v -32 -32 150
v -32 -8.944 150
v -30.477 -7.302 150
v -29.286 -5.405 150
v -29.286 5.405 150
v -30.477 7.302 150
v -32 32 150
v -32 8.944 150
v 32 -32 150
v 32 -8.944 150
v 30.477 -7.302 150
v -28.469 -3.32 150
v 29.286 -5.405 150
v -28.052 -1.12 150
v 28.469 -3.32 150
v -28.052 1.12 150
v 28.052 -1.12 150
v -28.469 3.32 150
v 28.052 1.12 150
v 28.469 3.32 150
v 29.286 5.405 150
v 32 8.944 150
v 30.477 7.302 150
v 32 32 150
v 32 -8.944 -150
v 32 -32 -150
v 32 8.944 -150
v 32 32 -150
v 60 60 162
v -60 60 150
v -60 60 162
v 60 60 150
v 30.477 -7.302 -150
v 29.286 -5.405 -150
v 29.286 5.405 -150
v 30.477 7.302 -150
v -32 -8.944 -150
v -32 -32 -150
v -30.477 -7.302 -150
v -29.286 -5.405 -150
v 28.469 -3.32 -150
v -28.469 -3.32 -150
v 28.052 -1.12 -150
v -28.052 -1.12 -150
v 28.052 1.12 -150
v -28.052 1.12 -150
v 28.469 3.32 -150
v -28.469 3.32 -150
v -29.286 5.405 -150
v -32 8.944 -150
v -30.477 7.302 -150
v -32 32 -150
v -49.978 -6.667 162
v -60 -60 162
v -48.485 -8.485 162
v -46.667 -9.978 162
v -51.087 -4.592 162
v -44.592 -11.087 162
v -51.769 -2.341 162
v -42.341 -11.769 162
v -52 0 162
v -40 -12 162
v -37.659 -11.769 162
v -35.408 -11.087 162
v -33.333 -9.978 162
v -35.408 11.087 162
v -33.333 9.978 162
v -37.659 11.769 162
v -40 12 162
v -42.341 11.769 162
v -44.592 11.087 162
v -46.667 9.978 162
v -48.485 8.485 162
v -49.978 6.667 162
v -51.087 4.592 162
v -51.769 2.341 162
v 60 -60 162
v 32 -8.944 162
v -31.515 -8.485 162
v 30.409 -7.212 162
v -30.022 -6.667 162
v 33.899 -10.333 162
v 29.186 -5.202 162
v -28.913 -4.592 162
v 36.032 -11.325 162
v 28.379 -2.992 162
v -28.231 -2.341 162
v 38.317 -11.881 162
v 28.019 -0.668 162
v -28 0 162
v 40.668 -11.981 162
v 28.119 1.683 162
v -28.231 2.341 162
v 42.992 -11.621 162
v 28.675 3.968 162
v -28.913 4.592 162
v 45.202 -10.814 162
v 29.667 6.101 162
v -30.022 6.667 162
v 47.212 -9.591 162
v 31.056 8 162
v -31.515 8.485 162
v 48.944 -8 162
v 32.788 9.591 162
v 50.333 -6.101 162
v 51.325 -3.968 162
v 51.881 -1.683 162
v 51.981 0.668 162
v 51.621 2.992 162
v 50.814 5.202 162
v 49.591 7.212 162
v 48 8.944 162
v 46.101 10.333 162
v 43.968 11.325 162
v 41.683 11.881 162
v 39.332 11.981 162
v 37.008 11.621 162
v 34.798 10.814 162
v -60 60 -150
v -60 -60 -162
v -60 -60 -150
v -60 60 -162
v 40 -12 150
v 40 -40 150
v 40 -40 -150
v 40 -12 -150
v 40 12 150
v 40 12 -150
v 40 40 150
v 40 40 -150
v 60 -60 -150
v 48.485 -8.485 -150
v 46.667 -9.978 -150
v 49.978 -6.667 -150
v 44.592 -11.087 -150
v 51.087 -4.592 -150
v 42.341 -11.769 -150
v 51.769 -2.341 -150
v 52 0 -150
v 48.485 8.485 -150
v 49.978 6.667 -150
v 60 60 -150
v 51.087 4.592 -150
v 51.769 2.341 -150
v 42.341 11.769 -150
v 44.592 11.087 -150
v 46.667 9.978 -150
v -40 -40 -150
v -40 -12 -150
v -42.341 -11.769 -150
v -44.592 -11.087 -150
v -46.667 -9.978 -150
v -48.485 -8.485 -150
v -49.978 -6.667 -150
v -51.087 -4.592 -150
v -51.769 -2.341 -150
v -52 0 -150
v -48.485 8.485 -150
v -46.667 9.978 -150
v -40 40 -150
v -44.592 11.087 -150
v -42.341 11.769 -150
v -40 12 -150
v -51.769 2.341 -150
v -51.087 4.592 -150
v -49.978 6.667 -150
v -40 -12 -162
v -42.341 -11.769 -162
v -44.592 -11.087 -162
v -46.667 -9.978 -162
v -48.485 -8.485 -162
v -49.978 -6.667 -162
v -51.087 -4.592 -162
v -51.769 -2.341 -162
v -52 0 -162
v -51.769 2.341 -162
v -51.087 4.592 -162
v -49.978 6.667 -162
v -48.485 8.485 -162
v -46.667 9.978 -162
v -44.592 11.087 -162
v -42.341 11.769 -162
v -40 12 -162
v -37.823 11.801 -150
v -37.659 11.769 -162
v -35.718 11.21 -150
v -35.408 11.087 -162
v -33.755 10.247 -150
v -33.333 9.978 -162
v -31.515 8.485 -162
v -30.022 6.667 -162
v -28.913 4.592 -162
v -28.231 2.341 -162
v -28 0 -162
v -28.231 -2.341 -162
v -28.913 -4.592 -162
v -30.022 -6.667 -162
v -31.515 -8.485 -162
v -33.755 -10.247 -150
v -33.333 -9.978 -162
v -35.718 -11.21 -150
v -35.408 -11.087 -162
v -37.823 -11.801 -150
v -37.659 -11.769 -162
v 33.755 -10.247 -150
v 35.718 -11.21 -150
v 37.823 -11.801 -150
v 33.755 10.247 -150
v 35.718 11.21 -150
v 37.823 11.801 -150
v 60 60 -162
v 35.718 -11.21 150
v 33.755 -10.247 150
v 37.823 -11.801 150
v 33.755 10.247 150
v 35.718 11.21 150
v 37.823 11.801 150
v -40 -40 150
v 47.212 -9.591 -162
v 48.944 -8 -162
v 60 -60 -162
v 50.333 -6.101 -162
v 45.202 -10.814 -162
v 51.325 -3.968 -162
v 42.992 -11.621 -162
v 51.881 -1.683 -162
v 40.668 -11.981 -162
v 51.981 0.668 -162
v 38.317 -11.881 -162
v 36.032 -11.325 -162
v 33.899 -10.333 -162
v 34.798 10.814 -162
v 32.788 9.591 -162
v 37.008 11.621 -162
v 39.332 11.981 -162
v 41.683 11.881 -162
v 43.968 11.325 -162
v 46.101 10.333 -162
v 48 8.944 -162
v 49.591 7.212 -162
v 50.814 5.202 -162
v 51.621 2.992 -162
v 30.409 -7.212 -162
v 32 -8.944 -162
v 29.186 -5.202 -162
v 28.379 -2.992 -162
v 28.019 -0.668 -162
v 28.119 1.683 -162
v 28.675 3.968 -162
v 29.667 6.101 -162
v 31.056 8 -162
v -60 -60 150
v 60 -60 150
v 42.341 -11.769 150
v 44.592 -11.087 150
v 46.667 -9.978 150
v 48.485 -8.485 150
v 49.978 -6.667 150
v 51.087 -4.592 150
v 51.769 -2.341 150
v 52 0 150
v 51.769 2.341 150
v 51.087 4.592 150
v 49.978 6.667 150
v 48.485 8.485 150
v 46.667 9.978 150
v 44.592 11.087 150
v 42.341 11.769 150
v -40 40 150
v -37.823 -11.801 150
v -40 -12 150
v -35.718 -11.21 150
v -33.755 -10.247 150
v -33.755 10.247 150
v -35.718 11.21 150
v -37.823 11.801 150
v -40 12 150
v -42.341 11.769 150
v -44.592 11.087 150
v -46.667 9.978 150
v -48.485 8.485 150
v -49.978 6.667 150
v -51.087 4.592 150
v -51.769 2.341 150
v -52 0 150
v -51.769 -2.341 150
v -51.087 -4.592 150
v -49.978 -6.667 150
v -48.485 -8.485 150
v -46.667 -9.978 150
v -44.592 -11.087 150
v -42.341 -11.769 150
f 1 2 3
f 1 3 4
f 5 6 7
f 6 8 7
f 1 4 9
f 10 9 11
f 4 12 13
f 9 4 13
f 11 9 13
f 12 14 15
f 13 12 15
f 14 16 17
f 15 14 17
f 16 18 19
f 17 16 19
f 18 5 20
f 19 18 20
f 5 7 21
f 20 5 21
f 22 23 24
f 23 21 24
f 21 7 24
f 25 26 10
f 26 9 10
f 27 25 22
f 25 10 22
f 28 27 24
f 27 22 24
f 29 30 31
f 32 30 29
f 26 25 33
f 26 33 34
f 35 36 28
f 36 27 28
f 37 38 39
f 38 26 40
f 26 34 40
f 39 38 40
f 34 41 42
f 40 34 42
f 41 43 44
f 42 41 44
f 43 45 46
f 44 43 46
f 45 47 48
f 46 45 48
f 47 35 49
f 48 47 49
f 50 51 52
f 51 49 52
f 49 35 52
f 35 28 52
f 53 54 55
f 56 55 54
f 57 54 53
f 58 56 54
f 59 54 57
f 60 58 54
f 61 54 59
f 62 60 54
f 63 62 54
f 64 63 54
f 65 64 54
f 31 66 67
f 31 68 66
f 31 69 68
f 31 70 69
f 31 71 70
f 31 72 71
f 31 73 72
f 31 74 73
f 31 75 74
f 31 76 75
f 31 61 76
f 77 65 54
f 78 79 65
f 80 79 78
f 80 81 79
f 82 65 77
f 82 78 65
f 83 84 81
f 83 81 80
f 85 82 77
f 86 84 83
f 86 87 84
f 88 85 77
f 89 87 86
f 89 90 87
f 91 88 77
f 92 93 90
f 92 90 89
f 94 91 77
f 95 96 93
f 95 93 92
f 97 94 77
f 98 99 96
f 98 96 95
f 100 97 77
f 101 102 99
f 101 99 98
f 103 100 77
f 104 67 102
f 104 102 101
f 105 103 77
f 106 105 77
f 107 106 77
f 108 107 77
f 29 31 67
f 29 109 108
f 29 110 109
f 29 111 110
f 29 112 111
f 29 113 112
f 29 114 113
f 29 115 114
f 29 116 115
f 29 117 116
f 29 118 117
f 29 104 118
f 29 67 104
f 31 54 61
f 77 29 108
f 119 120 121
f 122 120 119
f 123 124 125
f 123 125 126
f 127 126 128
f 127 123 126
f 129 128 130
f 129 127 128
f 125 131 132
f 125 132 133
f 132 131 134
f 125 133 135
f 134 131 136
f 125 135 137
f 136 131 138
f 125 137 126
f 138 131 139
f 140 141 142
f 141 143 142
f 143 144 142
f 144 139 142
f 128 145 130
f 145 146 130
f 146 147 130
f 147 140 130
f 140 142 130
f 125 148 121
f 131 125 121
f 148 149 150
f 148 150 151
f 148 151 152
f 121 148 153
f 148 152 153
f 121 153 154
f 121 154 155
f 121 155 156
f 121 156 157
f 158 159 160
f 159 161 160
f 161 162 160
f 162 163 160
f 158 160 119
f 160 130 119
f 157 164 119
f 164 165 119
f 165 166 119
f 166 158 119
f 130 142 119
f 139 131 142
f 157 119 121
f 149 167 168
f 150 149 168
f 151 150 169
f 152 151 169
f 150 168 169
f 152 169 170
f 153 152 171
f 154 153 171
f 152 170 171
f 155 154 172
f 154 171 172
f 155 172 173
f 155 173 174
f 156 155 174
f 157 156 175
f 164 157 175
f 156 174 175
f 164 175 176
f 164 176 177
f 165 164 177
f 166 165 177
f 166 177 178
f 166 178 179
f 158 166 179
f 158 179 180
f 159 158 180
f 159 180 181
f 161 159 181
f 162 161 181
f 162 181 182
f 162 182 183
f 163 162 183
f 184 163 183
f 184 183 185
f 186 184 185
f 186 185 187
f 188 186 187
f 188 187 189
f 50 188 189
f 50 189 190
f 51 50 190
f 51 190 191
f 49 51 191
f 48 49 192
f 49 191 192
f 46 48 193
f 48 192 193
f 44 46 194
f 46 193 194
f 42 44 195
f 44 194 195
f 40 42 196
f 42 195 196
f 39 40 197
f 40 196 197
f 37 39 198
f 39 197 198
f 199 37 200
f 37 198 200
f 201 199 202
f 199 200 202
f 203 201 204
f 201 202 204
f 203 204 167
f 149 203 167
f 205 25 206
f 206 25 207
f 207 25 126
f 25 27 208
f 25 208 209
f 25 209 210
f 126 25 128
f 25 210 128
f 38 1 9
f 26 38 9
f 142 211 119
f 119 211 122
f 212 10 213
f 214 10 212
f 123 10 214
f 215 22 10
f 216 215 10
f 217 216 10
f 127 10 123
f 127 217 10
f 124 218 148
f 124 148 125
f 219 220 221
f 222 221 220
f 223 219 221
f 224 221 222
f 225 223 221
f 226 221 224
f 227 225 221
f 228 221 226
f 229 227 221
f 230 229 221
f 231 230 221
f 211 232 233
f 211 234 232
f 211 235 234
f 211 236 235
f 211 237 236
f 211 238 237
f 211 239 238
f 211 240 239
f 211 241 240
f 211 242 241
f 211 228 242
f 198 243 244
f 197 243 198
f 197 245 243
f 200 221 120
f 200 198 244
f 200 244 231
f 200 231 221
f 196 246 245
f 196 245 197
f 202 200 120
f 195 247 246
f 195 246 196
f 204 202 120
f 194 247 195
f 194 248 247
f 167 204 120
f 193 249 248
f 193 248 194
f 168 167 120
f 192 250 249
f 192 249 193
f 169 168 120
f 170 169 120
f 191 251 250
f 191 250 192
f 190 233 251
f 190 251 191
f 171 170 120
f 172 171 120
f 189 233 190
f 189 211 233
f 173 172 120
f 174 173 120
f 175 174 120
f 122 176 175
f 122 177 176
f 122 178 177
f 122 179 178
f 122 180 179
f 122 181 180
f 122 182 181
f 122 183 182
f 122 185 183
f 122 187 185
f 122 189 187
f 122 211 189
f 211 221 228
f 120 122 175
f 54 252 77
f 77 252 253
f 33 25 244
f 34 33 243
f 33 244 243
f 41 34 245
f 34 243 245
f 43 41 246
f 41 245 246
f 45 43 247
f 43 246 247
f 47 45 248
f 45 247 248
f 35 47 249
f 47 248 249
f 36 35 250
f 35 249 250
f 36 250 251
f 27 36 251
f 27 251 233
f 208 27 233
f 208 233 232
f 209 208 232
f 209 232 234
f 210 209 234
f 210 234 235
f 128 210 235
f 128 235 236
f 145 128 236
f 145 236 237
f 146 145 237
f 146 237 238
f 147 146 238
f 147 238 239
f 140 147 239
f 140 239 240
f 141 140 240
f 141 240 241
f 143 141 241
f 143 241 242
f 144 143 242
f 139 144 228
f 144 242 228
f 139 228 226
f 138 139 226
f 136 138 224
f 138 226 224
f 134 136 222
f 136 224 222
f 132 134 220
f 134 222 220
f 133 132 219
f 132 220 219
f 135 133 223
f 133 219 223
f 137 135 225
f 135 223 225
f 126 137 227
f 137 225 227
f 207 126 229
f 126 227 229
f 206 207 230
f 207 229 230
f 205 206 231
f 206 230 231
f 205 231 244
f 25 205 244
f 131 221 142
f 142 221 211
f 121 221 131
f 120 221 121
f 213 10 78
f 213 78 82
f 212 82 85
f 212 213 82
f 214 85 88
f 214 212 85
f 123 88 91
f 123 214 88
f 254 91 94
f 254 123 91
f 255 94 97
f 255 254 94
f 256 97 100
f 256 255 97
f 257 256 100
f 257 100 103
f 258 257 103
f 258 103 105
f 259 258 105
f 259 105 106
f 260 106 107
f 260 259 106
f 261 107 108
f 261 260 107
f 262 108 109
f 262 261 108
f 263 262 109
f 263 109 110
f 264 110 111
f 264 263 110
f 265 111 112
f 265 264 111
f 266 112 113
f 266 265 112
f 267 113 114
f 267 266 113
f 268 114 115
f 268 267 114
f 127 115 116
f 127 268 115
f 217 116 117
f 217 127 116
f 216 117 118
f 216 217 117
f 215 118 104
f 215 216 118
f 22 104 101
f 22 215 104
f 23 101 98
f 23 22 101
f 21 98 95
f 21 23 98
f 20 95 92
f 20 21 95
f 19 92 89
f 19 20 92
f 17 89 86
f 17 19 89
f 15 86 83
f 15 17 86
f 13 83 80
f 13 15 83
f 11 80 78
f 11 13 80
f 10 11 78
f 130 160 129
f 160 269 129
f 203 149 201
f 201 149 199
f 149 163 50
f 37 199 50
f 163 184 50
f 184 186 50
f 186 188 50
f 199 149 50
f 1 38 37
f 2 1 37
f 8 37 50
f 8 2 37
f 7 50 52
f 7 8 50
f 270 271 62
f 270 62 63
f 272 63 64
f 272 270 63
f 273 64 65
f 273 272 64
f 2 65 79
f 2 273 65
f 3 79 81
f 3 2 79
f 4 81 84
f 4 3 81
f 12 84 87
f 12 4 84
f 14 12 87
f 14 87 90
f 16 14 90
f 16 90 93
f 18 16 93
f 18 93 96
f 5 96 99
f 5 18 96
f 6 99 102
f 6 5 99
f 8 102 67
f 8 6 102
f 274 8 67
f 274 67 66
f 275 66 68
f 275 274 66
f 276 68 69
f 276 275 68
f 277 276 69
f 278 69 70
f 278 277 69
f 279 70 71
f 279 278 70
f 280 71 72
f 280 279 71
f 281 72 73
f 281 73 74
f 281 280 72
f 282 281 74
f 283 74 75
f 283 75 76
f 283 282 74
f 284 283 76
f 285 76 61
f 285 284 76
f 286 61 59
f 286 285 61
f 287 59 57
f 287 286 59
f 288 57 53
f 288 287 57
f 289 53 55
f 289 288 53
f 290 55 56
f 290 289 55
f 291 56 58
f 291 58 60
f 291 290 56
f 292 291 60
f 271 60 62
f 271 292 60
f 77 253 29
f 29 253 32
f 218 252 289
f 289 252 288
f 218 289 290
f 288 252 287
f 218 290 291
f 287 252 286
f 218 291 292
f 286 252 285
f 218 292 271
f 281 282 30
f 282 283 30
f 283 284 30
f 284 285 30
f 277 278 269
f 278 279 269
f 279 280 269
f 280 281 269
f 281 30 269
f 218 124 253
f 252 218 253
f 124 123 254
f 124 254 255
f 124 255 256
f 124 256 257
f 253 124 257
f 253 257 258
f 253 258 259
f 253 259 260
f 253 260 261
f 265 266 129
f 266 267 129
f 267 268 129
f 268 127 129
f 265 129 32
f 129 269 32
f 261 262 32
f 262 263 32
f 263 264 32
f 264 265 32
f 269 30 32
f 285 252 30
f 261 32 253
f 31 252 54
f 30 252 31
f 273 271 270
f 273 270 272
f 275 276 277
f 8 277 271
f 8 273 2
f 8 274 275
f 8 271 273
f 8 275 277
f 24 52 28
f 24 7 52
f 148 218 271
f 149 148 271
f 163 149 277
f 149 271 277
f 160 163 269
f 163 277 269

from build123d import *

# Parameters (mm, degrees)
SKETCH_8_W      = 80
SKETCH_8_H      = 80
SKETCH_8_W_2    = 64
SKETCH_8_H_2    = 64
EXTRUDE_1_DEPTH = 150
SKETCH_9_W      = 120
SKETCH_9_H      = 120
SKETCH_9_R      = 12
EXTRUDE_2_DEPTH = 12
EXTRUDE_START   = 12
SKETCH_10_W     = 120
SKETCH_10_H     = 120
SKETCH_10_R     = 12
EXTRUDE_3_DEPTH = 12


with BuildPart() as part:
    # 草图8 → 凸台-拉伸1 (new, symmetric)
    with BuildSketch(Plane.XY):
        Rectangle(SKETCH_8_W, SKETCH_8_H)
        Rectangle(SKETCH_8_W_2, SKETCH_8_H_2, mode=Mode.SUBTRACT)
    extrude(amount=EXTRUDE_1_DEPTH, both=True)

    # 草图9 → 凸台-拉伸2 (add)
    with BuildSketch(Plane.XY.offset(150)):
        Rectangle(SKETCH_9_W, SKETCH_9_H)
        with Locations(Location((40, 0, 0), (0, 0, 228.189685104))):
            Circle(SKETCH_9_R, mode=Mode.SUBTRACT)
        with Locations(Location((-40, 0, 0), (0, 0, 270))):
            Circle(SKETCH_9_R, mode=Mode.SUBTRACT)
    extrude(amount=EXTRUDE_2_DEPTH)

    # 草图10 → 凸台-拉伸3 (add)
    with BuildSketch(Plane(origin=(0, 0, -150), x_dir=(-1, 0, 0), z_dir=(0, 0, -1)).offset(EXTRUDE_START)):
        Rectangle(SKETCH_10_W, SKETCH_10_H)
        with Locations(Location((40, 0, 0), (0, 0, 270))):
            Circle(SKETCH_10_R, mode=Mode.SUBTRACT)
        with Locations(Location((-40, 0, 0), (0, 0, 311.810314896))):
            Circle(SKETCH_10_R, mode=Mode.SUBTRACT)
    extrude(amount=-EXTRUDE_3_DEPTH)


solid = part.part
